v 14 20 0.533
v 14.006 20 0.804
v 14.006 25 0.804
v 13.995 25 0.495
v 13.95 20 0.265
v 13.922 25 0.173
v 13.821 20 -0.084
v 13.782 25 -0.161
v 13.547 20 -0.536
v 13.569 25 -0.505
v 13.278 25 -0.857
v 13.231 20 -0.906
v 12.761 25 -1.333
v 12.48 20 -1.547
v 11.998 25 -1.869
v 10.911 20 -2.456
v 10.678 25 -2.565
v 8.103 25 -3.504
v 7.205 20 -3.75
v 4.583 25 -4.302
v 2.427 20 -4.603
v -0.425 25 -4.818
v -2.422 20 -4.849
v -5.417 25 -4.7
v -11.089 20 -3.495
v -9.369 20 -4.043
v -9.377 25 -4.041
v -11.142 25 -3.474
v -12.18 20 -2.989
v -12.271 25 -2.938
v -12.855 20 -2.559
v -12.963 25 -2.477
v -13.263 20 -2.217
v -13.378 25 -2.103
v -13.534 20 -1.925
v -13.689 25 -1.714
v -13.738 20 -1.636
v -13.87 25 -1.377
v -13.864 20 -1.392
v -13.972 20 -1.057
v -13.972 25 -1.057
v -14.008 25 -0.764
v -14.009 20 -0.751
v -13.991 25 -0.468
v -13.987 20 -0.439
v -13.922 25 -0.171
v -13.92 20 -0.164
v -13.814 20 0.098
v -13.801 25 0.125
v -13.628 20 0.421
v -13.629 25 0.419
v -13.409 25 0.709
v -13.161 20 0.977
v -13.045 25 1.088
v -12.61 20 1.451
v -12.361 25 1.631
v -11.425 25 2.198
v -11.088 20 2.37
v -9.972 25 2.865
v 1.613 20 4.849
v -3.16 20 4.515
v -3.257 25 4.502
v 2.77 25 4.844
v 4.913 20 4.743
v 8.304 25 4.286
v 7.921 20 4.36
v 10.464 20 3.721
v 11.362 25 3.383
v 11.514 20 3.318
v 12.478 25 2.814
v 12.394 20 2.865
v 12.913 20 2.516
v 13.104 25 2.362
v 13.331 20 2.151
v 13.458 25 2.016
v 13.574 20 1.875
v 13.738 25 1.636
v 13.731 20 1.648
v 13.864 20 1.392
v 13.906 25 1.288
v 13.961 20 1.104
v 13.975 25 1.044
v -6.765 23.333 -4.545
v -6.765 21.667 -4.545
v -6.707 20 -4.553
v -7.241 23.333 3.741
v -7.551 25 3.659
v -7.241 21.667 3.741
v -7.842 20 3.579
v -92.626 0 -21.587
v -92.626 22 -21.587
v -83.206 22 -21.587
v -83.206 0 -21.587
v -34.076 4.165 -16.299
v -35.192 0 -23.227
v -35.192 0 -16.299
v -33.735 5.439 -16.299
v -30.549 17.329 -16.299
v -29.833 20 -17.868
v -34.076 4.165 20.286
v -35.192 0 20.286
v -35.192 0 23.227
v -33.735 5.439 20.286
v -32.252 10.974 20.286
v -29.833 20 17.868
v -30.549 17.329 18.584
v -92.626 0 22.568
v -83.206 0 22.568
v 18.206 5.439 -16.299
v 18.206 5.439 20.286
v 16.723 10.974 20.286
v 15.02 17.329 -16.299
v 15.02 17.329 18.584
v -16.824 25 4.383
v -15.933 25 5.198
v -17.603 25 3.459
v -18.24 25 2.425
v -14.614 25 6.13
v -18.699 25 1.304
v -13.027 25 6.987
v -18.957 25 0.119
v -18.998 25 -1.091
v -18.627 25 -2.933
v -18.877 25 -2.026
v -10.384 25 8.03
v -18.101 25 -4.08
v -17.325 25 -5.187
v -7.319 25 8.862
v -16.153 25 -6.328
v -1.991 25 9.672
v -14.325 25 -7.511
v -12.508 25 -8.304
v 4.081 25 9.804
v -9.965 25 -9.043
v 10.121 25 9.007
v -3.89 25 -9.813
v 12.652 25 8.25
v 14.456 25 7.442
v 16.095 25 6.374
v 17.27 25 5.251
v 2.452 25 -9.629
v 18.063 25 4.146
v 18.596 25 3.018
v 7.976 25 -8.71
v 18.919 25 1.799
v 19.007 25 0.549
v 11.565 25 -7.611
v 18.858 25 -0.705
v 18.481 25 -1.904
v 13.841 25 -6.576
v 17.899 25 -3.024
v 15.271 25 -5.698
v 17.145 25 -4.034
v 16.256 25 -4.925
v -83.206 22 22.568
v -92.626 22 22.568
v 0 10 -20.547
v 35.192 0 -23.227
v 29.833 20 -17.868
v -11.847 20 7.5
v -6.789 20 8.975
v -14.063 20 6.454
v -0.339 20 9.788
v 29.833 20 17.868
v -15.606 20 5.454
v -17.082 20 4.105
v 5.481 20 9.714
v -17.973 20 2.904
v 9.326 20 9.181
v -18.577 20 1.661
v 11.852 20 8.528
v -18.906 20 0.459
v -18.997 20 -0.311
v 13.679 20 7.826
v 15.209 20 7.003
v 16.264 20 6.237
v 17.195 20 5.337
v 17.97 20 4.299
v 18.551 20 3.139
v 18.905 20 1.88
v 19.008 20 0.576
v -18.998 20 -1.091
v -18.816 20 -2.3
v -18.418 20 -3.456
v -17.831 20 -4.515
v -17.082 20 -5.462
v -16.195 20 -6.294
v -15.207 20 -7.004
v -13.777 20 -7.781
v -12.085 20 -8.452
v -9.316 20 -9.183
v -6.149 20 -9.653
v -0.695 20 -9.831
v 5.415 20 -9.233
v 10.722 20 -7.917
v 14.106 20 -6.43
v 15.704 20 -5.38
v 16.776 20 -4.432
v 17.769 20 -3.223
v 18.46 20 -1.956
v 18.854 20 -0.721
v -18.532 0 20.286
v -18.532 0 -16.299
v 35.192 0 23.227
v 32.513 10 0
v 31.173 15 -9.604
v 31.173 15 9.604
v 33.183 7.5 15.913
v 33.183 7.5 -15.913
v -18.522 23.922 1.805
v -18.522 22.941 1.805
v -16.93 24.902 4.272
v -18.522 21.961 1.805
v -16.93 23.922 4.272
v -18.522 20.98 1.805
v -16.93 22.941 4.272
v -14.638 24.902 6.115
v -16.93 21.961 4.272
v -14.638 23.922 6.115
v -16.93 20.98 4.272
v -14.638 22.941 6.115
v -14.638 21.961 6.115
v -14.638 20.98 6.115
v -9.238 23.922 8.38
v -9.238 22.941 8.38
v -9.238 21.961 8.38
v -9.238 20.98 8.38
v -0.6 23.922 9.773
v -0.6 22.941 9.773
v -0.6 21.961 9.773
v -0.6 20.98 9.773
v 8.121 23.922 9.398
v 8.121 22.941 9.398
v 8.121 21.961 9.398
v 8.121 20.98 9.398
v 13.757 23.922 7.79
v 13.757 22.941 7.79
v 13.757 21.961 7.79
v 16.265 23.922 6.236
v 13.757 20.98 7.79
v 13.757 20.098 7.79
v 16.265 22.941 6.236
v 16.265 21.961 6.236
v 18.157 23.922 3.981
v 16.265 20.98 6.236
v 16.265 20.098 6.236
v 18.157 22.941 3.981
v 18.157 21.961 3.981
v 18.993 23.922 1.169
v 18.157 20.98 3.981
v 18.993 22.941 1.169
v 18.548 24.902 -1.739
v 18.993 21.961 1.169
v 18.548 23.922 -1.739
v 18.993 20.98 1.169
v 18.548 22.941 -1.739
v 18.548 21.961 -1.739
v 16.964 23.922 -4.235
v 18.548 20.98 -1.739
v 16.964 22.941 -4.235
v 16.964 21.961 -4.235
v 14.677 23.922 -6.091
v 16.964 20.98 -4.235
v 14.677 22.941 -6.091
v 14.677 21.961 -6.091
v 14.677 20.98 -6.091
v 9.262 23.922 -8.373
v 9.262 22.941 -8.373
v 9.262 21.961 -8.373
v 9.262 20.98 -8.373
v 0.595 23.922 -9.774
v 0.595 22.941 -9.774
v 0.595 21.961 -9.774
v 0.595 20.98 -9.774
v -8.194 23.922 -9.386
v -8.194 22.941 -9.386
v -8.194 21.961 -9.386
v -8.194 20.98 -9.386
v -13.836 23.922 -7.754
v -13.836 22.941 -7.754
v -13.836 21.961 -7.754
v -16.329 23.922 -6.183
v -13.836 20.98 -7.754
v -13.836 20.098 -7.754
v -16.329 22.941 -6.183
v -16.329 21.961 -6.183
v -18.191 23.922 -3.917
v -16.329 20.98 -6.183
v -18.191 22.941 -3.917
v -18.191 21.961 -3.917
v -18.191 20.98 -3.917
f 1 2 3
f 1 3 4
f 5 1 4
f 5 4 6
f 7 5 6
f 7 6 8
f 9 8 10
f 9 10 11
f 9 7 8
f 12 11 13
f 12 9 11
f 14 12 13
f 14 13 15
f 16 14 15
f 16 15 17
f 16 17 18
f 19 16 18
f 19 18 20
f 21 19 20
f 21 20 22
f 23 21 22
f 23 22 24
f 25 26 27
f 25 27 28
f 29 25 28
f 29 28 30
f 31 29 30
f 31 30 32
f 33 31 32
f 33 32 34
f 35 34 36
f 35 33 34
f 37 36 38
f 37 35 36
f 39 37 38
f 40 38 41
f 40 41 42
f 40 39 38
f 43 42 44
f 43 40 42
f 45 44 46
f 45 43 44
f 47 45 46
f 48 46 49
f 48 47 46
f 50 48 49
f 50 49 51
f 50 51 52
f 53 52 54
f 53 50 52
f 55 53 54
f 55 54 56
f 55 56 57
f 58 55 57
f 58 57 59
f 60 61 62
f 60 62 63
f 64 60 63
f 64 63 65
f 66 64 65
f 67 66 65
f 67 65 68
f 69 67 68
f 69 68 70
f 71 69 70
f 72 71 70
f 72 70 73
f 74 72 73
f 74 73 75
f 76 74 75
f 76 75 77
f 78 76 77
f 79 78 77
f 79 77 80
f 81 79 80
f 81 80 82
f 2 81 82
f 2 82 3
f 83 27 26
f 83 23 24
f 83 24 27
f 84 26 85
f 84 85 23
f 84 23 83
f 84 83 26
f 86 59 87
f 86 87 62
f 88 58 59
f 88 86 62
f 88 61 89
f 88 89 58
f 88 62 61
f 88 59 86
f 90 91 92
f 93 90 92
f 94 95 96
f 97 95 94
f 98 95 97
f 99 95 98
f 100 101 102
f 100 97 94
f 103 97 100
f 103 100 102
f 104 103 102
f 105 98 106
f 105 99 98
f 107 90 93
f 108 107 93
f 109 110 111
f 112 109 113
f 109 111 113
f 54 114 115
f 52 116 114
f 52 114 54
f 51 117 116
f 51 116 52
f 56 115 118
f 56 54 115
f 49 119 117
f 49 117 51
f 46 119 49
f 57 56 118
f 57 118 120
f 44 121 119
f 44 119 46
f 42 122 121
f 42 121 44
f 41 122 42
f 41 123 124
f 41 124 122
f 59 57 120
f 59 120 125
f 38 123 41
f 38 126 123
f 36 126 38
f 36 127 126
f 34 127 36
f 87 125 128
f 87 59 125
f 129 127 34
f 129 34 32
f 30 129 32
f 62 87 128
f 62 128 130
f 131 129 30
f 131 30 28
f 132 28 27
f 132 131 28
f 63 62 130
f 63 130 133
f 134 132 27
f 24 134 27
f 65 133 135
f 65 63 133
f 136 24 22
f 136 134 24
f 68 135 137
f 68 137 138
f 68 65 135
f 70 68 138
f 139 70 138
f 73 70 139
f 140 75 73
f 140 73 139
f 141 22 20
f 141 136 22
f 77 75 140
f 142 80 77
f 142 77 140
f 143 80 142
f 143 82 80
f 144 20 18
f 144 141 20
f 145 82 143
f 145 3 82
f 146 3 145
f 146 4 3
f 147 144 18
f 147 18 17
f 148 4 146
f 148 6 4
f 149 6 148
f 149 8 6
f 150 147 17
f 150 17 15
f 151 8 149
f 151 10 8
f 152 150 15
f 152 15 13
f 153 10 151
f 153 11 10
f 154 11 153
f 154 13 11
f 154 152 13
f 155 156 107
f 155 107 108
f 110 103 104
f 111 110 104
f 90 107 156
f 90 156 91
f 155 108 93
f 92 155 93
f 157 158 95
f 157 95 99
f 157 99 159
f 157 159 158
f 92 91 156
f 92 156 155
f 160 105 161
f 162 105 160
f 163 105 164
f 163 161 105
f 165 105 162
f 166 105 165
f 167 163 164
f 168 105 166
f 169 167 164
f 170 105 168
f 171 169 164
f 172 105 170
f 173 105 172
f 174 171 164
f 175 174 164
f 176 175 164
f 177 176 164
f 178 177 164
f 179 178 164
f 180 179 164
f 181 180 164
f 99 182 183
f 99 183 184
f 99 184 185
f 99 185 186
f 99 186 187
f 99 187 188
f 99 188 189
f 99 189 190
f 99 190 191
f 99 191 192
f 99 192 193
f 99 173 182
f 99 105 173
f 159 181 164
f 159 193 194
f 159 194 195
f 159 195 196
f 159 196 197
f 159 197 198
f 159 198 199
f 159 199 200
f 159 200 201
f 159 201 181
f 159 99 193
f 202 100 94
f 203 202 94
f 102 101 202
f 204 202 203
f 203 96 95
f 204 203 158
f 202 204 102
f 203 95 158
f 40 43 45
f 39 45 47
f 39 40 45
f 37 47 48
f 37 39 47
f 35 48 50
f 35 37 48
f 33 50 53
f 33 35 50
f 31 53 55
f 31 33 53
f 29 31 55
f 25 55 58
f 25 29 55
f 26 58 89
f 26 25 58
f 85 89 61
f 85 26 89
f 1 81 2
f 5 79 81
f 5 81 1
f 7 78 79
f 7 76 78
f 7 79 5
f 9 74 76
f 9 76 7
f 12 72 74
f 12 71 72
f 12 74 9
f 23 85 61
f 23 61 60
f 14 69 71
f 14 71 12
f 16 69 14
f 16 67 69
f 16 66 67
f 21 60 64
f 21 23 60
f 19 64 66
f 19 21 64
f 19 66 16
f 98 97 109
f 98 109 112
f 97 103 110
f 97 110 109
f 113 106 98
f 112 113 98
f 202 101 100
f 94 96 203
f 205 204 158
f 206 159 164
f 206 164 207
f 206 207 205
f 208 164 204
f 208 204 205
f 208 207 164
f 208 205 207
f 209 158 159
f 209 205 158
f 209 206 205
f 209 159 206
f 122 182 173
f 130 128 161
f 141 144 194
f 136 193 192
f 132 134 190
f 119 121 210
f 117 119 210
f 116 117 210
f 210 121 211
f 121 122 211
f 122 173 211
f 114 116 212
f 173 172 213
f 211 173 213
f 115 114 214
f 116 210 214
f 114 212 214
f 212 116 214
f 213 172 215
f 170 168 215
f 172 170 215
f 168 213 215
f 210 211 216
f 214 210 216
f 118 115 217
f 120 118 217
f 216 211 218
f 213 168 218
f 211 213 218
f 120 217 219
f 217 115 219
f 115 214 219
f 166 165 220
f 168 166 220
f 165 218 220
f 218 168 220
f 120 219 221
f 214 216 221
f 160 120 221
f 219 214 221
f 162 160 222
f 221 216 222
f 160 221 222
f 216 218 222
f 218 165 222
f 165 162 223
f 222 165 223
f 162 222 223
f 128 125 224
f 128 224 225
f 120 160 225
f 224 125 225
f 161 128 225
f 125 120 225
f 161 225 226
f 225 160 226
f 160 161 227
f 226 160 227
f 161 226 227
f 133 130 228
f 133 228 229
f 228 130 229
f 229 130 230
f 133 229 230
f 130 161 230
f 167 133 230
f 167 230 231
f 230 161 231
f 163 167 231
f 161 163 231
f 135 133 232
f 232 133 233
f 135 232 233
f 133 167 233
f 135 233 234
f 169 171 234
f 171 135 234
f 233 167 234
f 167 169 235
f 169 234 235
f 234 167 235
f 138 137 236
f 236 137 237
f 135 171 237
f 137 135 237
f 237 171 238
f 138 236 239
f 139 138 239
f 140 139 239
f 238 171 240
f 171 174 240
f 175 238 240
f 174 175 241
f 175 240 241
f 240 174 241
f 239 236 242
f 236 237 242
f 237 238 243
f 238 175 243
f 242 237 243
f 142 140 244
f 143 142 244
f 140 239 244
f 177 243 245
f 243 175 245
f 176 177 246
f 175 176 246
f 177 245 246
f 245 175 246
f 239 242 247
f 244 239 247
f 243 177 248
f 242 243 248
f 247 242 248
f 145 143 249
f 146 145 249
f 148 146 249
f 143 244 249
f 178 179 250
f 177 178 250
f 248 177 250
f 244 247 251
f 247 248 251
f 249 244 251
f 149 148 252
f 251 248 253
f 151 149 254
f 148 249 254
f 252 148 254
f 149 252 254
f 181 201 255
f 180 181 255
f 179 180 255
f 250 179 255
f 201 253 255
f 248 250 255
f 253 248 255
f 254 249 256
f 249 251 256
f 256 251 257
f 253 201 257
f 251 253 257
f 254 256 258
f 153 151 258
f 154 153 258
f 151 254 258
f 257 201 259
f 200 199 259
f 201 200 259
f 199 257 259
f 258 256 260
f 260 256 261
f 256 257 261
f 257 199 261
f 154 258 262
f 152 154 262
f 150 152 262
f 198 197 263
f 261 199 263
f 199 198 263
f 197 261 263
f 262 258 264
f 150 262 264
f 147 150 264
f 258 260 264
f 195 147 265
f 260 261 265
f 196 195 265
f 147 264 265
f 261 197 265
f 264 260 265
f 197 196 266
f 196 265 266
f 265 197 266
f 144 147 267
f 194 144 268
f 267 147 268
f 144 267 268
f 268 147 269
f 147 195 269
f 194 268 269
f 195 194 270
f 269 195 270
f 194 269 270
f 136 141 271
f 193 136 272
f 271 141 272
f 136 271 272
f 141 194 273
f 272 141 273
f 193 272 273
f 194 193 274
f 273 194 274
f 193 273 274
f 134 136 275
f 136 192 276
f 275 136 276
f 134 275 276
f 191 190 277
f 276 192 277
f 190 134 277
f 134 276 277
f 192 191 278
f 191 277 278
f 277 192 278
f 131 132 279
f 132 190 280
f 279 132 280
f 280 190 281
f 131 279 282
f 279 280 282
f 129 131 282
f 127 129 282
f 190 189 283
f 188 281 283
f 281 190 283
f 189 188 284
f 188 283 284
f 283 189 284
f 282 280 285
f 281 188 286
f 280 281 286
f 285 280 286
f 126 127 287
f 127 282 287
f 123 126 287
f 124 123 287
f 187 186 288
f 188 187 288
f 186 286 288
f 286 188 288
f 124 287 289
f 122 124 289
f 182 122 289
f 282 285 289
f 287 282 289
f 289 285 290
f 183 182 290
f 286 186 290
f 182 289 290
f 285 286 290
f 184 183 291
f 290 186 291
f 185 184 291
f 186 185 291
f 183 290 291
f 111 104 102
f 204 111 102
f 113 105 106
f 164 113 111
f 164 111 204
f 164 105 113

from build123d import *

# Parameters (mm, degrees)
EXTRUDE_THIN2_DEPTH = 10
SKETCH1_W           = 70.384750894
SKETCH1_H           = 46.45393559
BOSS_EXTRUDE1_DEPTH = 20
BOSS_EXTRUDE1_TAPER = 15
SKETCH3_W           = 9.419570306
SKETCH3_H           = 44.154235808
BOSS_EXTRUDE2_DEPTH = 22
SKETCH6_W           = 36.585558134
SKETCH6_H           = 11.890141367
CUT_EXTRUDE3_DEPTH  = 131.353188747
CUT_EXTRUDE5_REACH  = 125.218
SKETCH6_2_W         = 36.585558134
SKETCH6_2_H         = 11.890141367


# Read off the part's stored shape, not the designer's step: Extrude-Thin2
with BuildPart() as part:
    # Extrude-Thin2 outline → Extrude-Thin2 (new body)
    with BuildSketch(Plane(origin=(0, 15, 0), x_dir=(1, 0, 0), z_dir=(0, 1, 0))):
        with BuildLine():
            add(Edge.make_bspline(
                [(-18.998176096, 1.091111465), (-19.026707732, 0.594325331), (-18.999367317, 0.104018854), (-18.83922552, -0.864363457), (-18.703680911, -1.347203381), (-18.3399848, -2.261851117), (-18.112261527, -2.697223431), (-17.707133567, -3.31987619), (-17.561821431, -3.521551229), (-17.256961844, -3.907816675), (-17.096781418, -4.093403121), (-16.595177089, -4.629654759), (-16.232755973, -4.959876356), (-15.461071442, -5.574712302), (-15.054347497, -5.85695505), (-13.805954836, -6.63094112), (-12.927764124, -7.058648253), (-11.566435483, -7.615551307), (-11.103841353, -7.787060437), (-10.174587257, -8.102627564), (-9.707404908, -8.246978438), (-8.299413393, -8.646153824), (-7.35223485, -8.86749584), (-4.490581722, -9.425768365), (-2.556465159, -9.659445057), (1.357293874, -9.887478163), (3.303327245, -9.879702174), (6.200653464, -9.65983033), (7.162906962, -9.55121436), (9.078571867, -9.245294735), (10.032046369, -9.048623919), (11.452718842, -8.65793707), (11.9266494, -8.510746971), (12.85569307, -8.180056561), (13.311644387, -7.996503088), (14.202230408, -7.584108491), (14.636891218, -7.35532283), (15.478877759, -6.83967748), (15.887069074, -6.551358026), (16.643700007, -5.920527822), (16.995248402, -5.576502963), (17.474900792, -5.009513782), (17.627403163, -4.810961371), (17.908706639, -4.404269033), (18.03825758, -4.19541772), (18.393085214, -3.552089081), (18.584867144, -3.101000921), (18.798682542, -2.387741026), (18.857193023, -2.144228508), (18.945701646, -1.658357403), (19.006794174, -1.170307901), (19.013618817, -0.677946444), (18.992794611, -0.183388095), (18.96823576, 0.066297242), (18.854500651, 0.801231602), (18.725987683, 1.27686101), (18.458326403, 1.969941266), (18.355931811, 2.198561706), (18.130515869, 2.640532605), (18.007315595, 2.854681318), (17.741382483, 3.270251415), (17.598643631, 3.47166888), (17.294728923, 3.862490343), (17.132787663, 4.052672698), (16.290405012, 4.963385446), (15.515687177, 5.567111077), (14.257012777, 6.353073628), (13.822653055, 6.593402096), (12.94323625, 7.033551812), (12.496129735, 7.234613427), (11.137127407, 7.792353287), (10.207819429, 8.104282044), (8.788810338, 8.507803751), (8.310544766, 8.631586187), (7.352701557, 8.858171042), (6.872955469, 8.961073581), (4.470557325, 9.429367072), (2.537273087, 9.660774665), (-1.348091277, 9.886730042), (-3.300161897, 9.881397642), (-6.245544824, 9.655679831), (-7.223886131, 9.543762437), (-8.679326473, 9.307773994), (-9.162704785, 9.217644142), (-10.125304394, 9.010429698), (-10.605034859, 8.893160068), (-12.02408202, 8.495857862), (-12.947532321, 8.171409054), (-14.279627464, 7.544682665), (-14.717244368, 7.31039063), (-15.555064148, 6.787865653), (-15.954012351, 6.500823944), (-16.516197897, 6.023463957), (-16.697537387, 5.856523429), (-17.046752813, 5.505255067), (-17.214119751, 5.321239539), (-17.684348837, 4.752778083), (-17.958995408, 4.348692272), (-18.423559979, 3.485739746), (-18.614542316, 3.020985977), (-18.886100797, 2.073730131), (-18.96964446, 1.587897599), (-18.998176096, 1.091111465)],
                knots=[0, 0, 0, 0, 0.015625, 0.015625, 0.03125, 0.03125, 0.046875, 0.046875, 0.0546875, 0.0546875, 0.0625, 0.0625, 0.078125, 0.078125, 0.09375, 0.09375, 0.125, 0.125, 0.140625, 0.140625, 0.15625, 0.15625, 0.1875, 0.1875, 0.25, 0.25, 0.3125, 0.3125, 0.34375, 0.34375, 0.375, 0.375, 0.390625, 0.390625, 0.40625, 0.40625, 0.421875, 0.421875, 0.4375, 0.4375, 0.453125, 0.453125, 0.4609375, 0.4609375, 0.46875, 0.46875, 0.484375, 0.484375, 0.4921875, 0.4921875, 0.5, 0.5078125, 0.5078125, 0.515625, 0.515625, 0.53125, 0.53125, 0.5390625, 0.5390625, 0.546875, 0.546875, 0.5546875, 0.5546875, 0.5625, 0.5625, 0.59375, 0.59375, 0.609375, 0.609375, 0.625, 0.625, 0.65625, 0.65625, 0.671875, 0.671875, 0.6875, 0.6875, 0.75, 0.75, 0.8125, 0.8125, 0.84375, 0.84375, 0.859375, 0.859375, 0.875, 0.875, 0.90625, 0.90625, 0.921875, 0.921875, 0.9375, 0.9375, 0.9453125, 0.9453125, 0.953125, 0.953125, 0.96875, 0.96875, 0.984375, 0.984375, 1, 1, 1, 1], degree=3))
        make_face()
        with BuildLine():
            add(Edge.make_bspline(
                [(14.006401962, -0.804421734), (14.482284092, 7.481525938), (-6.765259916, 4.545184703), (-28.012803925, 1.608843469), (-7.241142046, -3.740762969), (13.530519833, -9.090369406), (14.006401962, -0.804421734)],
                knots=[0, 0, 0, 2.094395102, 2.094395102, 4.188790205, 4.188790205, 6.283185307, 6.283185307, 6.283185307], degree=2, weights=[1, 0.5, 1, 0.5, 1, 0.5, 1]))
        make_face(mode=Mode.SUBTRACT)
    extrude(amount=EXTRUDE_THIN2_DEPTH)

    # Sketch1 → Boss-Extrude1 (add)
    with BuildSketch(Plane(origin=(0, 0, 0), x_dir=(1, 0, 0), z_dir=(0, 1, 0))):
        Rectangle(SKETCH1_W, SKETCH1_H)
    extrude(amount=BOSS_EXTRUDE1_DEPTH, taper=BOSS_EXTRUDE1_TAPER)

    # Sketch6 → Cut-Extrude3 (cut, along a direction that is not the sketch's normal)
    with BuildSketch(Plane(origin=(-83.206204367, 0, 0), x_dir=(0, 0, -1), z_dir=(1, 0, 0))):
        with Locations((-1.99360281, 11.38426496)):
            Rectangle(SKETCH6_W, SKETCH6_H)
    extrude(amount=CUT_EXTRUDE3_DEPTH, dir=(0.9659258262890681, -0.25881904510252135, 0), mode=Mode.SUBTRACT)

    # Cut-Extrude5: up to this plane
    cut_extrude5_end = Plane(origin=(20.703488052, -3.882285677, -23.226967795), z_dir=(0.9659258262890681, 0.25881904510252135, 0))
    # Sketch6<2> → Cut-Extrude5 (cut, up to the surface)
    with BuildSketch(Plane(origin=(-83.206204367, 0, 0), x_dir=(0, 0, -1), z_dir=(1, 0, 0)), mode=Mode.PRIVATE) as cut_extrude5_sk1:
        with Locations((-1.99360281, 11.38426496)):
            Rectangle(SKETCH6_2_W, SKETCH6_2_H)
    cut_extrude5_tool1 = split(extrude(cut_extrude5_sk1.sketch, amount=CUT_EXTRUDE5_REACH, mode=Mode.PRIVATE), bisect_by=cut_extrude5_end, keep=Keep.BOTH, mode=Mode.PRIVATE)
    add(cut_extrude5_tool1.solids().sort_by_distance((-83.206204, 11.384265, 1.993603))[0], mode=Mode.SUBTRACT)


with BuildPart() as body_2:
    # Sketch3 → Boss-Extrude2 (new body)
    with BuildSketch(Plane(origin=(0, 0, 0), x_dir=(1, 0, 0), z_dir=(0, 1, 0))):
        with Locations((-87.91598952, -0.49060262)):
            Rectangle(SKETCH3_W, SKETCH3_H)
    extrude(amount=BOSS_EXTRUDE2_DEPTH)


solid = Compound([part.part, body_2.part])
